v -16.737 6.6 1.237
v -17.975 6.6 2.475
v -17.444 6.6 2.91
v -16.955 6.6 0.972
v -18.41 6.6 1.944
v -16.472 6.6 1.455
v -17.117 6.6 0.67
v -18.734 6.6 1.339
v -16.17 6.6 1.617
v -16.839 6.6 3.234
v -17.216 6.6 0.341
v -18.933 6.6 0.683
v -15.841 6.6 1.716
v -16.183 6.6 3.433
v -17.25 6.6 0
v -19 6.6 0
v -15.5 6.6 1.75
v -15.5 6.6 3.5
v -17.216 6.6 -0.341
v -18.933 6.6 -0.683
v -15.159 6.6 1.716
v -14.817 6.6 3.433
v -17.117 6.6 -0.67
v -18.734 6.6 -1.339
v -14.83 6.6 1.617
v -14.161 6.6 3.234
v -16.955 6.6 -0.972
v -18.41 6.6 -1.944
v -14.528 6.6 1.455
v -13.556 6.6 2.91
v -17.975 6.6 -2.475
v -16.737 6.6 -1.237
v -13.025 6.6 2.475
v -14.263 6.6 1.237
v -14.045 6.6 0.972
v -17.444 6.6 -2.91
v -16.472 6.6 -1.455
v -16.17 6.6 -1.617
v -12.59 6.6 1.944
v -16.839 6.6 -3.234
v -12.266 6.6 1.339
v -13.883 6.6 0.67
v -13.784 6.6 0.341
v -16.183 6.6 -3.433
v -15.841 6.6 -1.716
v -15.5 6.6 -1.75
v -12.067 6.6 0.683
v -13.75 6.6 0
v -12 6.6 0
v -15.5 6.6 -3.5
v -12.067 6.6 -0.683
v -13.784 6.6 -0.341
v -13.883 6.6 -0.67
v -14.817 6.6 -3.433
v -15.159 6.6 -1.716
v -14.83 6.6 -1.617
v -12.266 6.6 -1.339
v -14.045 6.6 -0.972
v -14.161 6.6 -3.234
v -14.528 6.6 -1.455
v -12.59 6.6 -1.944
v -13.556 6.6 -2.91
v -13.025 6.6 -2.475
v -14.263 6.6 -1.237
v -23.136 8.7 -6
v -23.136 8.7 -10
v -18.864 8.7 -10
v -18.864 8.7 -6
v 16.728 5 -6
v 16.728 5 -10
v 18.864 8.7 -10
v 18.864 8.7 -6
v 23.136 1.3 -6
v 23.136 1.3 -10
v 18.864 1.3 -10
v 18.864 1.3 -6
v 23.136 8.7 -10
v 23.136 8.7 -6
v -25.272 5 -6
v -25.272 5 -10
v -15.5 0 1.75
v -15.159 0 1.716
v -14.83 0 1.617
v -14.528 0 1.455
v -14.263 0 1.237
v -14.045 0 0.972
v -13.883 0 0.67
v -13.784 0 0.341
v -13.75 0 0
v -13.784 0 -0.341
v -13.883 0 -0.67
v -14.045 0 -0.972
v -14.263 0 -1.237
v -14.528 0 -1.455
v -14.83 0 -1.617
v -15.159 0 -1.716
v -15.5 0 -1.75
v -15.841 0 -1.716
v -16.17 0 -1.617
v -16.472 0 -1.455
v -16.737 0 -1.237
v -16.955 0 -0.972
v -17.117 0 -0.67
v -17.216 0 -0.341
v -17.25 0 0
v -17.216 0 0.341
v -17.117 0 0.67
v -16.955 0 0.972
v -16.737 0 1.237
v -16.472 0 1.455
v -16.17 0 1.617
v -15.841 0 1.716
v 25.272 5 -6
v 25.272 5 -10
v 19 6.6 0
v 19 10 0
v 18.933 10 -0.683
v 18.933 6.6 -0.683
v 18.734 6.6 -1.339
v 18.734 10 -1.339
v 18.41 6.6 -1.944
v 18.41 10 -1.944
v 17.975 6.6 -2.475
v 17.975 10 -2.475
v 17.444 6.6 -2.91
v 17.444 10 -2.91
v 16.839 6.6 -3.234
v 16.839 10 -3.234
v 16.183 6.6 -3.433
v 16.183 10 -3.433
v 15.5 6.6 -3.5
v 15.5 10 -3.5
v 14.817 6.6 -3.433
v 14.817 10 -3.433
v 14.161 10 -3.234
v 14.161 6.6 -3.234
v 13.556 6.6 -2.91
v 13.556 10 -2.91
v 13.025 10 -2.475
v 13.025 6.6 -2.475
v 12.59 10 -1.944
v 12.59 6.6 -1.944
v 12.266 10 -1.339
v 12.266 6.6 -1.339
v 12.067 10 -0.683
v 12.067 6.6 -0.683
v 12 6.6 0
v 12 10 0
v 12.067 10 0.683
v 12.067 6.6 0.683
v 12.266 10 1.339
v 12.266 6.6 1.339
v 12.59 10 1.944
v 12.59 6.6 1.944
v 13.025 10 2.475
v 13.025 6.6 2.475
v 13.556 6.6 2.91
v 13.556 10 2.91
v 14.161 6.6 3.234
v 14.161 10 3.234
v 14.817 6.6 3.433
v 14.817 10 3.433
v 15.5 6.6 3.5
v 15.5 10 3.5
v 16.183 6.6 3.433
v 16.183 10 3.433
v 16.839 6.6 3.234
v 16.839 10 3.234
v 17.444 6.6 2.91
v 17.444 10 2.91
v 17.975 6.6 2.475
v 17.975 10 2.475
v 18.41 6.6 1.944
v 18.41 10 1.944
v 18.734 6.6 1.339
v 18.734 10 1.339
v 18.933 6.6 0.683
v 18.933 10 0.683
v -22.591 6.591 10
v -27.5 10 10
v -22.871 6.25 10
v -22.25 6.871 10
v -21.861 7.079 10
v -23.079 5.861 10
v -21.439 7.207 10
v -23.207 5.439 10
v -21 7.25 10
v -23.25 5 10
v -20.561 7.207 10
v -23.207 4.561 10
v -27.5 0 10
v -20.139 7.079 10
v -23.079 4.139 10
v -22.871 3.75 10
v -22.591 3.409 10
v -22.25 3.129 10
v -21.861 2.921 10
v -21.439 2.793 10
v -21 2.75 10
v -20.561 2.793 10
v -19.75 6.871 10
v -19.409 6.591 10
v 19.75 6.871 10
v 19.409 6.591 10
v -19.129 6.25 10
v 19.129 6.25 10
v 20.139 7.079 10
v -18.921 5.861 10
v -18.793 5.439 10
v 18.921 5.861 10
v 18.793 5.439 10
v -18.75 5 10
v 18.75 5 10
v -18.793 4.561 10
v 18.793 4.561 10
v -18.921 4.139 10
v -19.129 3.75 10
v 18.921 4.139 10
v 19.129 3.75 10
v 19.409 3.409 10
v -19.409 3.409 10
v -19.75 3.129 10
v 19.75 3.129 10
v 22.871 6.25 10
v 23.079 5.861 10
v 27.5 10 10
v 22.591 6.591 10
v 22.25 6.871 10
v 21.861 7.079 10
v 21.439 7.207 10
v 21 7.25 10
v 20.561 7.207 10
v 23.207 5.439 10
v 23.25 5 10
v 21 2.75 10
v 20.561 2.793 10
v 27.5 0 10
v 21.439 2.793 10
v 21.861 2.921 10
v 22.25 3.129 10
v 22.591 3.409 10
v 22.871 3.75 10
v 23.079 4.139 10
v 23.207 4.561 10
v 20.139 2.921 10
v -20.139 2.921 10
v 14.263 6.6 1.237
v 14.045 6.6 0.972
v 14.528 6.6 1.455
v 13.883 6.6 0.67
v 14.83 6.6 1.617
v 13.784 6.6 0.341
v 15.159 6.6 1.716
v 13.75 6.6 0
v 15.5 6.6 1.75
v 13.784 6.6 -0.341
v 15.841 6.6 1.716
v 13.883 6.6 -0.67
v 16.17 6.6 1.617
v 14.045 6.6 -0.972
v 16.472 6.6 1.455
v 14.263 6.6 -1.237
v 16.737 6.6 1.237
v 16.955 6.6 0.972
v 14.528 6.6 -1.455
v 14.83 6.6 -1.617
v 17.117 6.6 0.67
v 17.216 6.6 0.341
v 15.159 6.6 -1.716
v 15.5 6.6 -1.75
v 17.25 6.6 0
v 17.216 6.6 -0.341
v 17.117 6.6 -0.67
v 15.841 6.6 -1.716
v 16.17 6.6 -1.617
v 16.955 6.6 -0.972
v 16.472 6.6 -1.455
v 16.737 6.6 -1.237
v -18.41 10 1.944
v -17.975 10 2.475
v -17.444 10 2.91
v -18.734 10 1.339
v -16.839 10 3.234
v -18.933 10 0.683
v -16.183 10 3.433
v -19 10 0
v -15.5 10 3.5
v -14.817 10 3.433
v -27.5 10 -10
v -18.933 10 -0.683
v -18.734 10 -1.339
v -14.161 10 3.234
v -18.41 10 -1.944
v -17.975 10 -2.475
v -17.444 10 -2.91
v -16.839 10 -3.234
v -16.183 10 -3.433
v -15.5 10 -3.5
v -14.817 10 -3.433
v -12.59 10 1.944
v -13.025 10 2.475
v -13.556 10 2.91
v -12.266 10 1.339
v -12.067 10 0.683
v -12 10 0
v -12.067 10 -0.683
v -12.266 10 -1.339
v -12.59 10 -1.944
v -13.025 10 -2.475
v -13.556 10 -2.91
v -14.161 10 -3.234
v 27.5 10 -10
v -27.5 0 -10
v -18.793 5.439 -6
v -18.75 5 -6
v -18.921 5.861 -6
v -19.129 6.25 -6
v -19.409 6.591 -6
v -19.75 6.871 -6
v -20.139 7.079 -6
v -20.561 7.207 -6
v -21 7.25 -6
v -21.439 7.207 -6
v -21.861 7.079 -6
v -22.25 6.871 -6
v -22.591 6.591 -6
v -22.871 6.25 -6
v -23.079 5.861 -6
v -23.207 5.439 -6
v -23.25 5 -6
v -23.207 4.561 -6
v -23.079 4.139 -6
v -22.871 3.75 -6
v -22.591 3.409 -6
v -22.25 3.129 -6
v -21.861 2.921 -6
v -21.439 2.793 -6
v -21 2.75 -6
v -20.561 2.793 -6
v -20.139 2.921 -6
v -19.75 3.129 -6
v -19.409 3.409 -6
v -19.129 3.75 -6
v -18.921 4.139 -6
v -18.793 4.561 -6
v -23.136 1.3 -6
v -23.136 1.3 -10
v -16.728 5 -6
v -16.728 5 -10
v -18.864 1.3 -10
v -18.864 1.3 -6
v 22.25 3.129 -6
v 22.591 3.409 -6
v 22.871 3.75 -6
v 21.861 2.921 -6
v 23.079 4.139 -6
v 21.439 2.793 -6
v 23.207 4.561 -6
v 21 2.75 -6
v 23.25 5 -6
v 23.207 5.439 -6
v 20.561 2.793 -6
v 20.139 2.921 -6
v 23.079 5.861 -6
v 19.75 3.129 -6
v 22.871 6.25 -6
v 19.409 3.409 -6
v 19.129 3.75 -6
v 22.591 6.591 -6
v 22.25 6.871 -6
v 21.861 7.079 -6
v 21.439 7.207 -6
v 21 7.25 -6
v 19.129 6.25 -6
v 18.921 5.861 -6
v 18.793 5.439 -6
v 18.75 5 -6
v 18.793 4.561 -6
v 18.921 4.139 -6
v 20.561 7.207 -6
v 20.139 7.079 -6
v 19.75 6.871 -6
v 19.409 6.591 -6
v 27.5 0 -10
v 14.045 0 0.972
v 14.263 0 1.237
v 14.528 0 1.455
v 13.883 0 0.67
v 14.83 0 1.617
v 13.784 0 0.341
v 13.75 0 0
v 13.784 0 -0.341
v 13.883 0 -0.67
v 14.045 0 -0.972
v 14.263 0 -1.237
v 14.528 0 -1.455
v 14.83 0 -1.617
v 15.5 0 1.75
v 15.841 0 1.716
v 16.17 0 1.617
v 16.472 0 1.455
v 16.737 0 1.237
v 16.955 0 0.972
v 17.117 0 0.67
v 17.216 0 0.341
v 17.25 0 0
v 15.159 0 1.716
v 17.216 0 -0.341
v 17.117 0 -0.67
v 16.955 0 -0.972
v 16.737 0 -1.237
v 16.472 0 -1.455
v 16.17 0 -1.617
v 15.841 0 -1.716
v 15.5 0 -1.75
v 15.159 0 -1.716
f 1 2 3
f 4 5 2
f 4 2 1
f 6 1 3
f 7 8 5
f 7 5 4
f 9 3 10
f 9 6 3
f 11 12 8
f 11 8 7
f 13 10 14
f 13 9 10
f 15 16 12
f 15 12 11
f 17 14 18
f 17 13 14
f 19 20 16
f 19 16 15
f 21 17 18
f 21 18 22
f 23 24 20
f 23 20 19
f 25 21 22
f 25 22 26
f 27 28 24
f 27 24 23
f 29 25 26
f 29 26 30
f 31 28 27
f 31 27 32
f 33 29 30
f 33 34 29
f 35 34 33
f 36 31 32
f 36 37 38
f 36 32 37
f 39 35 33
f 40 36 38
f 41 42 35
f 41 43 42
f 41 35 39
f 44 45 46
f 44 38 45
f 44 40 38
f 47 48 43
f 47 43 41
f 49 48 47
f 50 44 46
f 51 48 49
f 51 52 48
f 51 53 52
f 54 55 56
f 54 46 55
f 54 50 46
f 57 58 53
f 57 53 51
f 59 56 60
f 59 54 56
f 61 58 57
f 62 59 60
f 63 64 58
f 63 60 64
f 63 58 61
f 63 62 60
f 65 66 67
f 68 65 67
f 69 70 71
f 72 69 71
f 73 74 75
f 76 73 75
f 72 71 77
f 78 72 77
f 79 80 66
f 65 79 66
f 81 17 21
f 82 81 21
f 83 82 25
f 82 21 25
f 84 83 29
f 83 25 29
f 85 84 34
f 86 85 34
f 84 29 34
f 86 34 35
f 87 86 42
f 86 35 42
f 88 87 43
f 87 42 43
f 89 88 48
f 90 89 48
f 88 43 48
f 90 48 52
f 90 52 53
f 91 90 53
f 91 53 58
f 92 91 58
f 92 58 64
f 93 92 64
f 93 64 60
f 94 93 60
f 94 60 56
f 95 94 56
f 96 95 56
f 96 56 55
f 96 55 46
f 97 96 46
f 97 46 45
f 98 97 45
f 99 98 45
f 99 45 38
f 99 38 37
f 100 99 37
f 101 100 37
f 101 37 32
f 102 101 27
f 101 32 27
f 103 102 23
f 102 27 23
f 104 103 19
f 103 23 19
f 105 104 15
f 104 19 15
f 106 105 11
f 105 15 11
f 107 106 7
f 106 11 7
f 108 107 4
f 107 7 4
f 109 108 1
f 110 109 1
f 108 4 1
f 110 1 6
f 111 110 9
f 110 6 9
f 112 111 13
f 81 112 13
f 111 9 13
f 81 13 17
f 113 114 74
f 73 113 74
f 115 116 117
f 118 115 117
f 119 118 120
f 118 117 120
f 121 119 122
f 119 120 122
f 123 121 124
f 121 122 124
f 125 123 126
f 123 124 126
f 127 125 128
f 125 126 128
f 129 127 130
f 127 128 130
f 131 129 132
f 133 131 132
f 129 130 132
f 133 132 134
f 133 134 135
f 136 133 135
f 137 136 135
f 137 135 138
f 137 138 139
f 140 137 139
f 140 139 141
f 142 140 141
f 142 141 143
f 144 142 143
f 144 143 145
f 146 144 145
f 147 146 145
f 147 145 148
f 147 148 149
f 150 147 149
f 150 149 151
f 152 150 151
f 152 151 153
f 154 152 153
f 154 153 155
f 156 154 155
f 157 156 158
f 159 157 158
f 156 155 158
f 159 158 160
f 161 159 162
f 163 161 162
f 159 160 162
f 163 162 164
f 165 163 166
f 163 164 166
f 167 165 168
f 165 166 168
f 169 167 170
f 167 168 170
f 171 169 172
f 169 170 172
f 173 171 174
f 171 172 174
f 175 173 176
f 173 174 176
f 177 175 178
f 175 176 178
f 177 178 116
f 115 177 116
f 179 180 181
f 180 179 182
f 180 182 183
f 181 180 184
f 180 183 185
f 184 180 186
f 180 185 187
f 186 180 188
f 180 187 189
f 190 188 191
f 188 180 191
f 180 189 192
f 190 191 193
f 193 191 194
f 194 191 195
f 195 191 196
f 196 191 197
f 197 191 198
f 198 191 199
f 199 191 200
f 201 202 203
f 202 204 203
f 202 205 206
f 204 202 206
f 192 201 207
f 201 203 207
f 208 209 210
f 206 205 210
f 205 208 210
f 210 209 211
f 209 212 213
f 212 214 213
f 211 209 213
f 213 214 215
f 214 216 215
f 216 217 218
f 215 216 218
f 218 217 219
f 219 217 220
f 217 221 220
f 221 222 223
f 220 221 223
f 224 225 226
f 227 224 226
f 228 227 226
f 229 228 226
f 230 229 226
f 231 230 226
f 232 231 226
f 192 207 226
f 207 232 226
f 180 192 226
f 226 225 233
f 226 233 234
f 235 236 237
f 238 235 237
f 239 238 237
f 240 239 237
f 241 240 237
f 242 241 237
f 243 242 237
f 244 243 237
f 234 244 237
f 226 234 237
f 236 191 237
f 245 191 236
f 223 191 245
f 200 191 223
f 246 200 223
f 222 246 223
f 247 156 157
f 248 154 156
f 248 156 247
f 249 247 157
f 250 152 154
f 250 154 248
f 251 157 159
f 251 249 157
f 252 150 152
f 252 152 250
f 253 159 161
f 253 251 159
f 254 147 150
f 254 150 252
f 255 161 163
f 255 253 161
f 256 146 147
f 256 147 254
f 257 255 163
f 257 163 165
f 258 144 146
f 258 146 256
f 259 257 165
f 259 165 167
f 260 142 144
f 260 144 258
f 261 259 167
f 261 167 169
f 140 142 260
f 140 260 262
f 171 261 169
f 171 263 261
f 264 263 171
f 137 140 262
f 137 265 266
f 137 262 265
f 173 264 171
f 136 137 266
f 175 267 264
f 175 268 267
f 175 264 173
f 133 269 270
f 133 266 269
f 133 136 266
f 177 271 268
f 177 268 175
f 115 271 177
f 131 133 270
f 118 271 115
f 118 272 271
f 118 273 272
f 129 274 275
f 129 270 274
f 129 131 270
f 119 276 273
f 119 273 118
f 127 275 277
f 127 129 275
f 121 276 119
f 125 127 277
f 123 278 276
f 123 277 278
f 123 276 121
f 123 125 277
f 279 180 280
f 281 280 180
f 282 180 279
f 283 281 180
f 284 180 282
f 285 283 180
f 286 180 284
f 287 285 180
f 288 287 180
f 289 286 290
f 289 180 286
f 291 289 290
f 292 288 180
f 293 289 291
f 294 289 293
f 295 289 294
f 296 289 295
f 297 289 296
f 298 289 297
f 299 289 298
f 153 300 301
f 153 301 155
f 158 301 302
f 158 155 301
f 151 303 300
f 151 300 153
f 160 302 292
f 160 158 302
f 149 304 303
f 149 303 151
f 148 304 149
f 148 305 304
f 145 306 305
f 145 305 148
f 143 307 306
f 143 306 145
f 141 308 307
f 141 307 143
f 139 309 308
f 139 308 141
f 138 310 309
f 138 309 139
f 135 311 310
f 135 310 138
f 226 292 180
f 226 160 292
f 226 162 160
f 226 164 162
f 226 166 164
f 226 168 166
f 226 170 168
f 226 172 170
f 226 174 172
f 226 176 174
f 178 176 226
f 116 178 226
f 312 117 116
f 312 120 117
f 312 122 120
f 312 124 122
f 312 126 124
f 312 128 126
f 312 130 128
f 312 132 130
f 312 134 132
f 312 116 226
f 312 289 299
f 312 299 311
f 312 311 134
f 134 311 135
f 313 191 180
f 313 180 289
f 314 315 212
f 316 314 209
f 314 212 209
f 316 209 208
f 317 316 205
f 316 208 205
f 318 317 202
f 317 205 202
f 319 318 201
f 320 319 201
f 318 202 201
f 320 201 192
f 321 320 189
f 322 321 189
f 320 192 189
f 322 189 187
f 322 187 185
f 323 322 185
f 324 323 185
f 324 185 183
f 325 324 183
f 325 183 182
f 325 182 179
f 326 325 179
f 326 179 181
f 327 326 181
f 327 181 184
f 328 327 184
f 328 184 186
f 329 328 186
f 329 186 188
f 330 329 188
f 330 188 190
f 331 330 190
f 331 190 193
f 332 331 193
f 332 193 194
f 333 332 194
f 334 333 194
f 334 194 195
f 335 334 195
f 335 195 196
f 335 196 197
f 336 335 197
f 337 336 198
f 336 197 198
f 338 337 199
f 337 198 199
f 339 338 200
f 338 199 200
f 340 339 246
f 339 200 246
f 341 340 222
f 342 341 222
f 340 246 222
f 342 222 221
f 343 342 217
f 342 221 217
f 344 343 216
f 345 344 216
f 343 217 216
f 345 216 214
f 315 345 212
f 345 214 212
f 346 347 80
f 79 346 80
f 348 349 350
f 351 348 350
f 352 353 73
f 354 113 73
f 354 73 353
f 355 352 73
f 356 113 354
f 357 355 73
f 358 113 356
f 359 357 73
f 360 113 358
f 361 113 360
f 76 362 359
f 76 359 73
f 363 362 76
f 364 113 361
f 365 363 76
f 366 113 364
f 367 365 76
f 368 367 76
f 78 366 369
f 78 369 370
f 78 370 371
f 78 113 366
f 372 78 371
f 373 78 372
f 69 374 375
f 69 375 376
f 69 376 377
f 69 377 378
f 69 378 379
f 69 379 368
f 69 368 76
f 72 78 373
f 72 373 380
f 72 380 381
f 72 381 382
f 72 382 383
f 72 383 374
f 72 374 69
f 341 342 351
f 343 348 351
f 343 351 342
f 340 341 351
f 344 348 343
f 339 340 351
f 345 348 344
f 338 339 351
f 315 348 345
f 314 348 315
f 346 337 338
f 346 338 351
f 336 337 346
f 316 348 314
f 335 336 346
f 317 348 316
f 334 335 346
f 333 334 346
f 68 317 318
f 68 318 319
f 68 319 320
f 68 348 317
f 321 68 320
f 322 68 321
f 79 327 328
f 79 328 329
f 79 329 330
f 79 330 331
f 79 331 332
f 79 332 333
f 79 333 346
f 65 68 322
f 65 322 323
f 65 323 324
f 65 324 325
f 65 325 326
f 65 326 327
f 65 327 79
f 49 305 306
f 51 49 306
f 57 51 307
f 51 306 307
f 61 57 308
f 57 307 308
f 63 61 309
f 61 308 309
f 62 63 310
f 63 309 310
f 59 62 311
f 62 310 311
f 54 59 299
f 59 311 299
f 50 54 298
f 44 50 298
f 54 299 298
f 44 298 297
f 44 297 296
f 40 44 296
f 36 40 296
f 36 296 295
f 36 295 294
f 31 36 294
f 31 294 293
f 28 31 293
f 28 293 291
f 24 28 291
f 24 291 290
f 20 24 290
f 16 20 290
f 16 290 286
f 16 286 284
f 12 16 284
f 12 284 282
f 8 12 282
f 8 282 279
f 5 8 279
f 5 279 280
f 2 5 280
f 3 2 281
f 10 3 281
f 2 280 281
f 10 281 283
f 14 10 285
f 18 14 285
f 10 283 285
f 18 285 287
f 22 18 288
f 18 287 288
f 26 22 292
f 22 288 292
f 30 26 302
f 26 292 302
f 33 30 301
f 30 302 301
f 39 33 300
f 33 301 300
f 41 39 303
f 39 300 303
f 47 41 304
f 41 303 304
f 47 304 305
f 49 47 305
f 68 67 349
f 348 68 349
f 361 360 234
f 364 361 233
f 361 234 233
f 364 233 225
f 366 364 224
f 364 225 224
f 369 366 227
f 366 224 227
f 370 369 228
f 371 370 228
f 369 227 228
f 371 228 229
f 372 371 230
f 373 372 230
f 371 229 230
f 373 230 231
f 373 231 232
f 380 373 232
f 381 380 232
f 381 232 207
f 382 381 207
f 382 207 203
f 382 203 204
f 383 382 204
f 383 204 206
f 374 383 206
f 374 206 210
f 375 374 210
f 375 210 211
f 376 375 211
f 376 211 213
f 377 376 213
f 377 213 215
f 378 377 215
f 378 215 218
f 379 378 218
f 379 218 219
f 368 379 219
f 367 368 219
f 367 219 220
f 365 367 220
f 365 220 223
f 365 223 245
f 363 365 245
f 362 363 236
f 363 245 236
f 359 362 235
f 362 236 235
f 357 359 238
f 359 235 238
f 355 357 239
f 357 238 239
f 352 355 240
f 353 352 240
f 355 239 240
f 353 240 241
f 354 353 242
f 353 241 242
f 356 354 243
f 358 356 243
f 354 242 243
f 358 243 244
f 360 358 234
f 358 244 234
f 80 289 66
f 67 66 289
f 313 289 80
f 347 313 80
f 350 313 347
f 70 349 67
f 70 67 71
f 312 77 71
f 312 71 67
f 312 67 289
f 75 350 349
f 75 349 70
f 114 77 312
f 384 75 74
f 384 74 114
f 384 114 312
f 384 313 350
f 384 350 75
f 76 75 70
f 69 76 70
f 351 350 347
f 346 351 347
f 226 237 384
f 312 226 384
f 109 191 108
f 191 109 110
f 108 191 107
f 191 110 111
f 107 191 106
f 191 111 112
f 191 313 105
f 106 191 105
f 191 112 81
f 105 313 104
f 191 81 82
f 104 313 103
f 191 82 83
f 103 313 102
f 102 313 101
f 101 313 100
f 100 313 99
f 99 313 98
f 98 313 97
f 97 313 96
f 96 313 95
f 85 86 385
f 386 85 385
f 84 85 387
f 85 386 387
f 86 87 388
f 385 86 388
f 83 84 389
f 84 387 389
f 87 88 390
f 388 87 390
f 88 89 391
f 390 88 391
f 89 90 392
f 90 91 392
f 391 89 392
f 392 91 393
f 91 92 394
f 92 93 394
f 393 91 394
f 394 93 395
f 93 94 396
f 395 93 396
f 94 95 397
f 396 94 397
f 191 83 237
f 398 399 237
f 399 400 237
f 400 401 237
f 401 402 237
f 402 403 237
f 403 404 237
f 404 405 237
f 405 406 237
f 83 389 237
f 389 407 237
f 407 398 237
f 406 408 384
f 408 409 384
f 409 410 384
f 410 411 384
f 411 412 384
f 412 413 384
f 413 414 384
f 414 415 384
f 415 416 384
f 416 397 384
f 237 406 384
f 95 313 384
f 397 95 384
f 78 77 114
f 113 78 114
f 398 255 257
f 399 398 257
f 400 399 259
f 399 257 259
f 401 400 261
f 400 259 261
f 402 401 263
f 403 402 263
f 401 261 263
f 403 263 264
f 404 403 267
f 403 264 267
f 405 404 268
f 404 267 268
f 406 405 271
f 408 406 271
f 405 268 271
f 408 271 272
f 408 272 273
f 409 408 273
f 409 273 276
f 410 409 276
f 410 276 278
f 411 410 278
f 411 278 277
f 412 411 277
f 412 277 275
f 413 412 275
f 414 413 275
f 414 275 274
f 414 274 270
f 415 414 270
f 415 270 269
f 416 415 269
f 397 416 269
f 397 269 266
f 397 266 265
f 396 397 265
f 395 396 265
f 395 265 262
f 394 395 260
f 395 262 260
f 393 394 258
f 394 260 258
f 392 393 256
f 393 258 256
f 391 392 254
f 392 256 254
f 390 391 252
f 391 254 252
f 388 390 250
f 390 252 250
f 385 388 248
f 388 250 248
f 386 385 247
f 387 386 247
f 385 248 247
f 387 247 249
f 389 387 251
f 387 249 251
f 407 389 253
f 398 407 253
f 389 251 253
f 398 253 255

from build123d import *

# Parameters (mm, degrees)
SKETCH1_W                                           = 55
SKETCH1_H                                           = 20
BOSS_EXTRUDE1_DEPTH                                 = 10
SKETCH2_R                                           = 2.25
CUT_EXTRUDE1_DEPTH                                  = 36.443617197
SKETCH3_R                                           = 1.75
CUT_EXTRUDE2_DEPTH                                  = 31.923292192
CBORE_FOR_M3_HEX_SOCKET_HEAD_CAP_SCREW1_D           = 3.4
CBORE_FOR_M3_HEX_SOCKET_HEAD_CAP_SCREW1_CBORE_D     = 7
CBORE_FOR_M3_HEX_SOCKET_HEAD_CAP_SCREW1_CBORE_DEPTH = 3.4
CUT_EXTRUDE3_DEPTH                                  = 4


with BuildPart() as part:
    # Sketch1 → Boss-Extrude1 (new body)
    with BuildSketch(Plane(origin=(0, 0, 0), x_dir=(1, 0, 0), z_dir=(0, 1, 0))):
        Rectangle(SKETCH1_W, SKETCH1_H)
    extrude(amount=BOSS_EXTRUDE1_DEPTH)

    # Sketch2 → Cut-Extrude1 (cut, through all)
    with BuildSketch(Plane.XY.offset(10)):
        with Locations((-21, 5)):
            Circle(SKETCH2_R)
        with Locations((21, 5)):
            Circle(SKETCH2_R)
    extrude(amount=-CUT_EXTRUDE1_DEPTH, mode=Mode.SUBTRACT)

    # Sketch3 → Cut-Extrude2 (cut, through all)
    with BuildSketch(Plane(origin=(0, 10, 0), x_dir=(1, 0, 0), z_dir=(0, 1, 0))):
        with Locations(Location((-15.5, 0, 0), (0, 0, 270))):
            Circle(SKETCH3_R)
        with Locations(Location((15.5, 0, 0), (0, 0, 270))):
            Circle(SKETCH3_R)
    extrude(amount=-CUT_EXTRUDE2_DEPTH, mode=Mode.SUBTRACT)

    # CBORE for M3 Hex Socket Head Cap Screw1 (through all)
    with Locations(Plane(origin=(0, 10, 0), x_dir=(1, 0, 0), z_dir=(0, 1, 0))):
        with Locations((-15.5, 0), (15.5, 0)):
            CounterBoreHole(CBORE_FOR_M3_HEX_SOCKET_HEAD_CAP_SCREW1_D / 2, CBORE_FOR_M3_HEX_SOCKET_HEAD_CAP_SCREW1_CBORE_D / 2, CBORE_FOR_M3_HEX_SOCKET_HEAD_CAP_SCREW1_CBORE_DEPTH)

    # Sketch6 → Cut-Extrude3 (cut)
    with BuildSketch(Plane(origin=(0, 0, -10), x_dir=(-1, 0, 0), z_dir=(0, 0, -1))):
        Polygon((-16.727608008, 5), (-18.863804004, 8.7), (-23.136195996, 8.7), (-25.272391992, 5), (-23.136195996, 1.3), (-18.863804004, 1.3), align=None)
        Polygon((16.727608008, 5), (18.863804004, 1.3), (23.136195996, 1.3), (25.272391992, 5), (23.136195996, 8.7), (18.863804004, 8.7), align=None)
    extrude(amount=-CUT_EXTRUDE3_DEPTH, mode=Mode.SUBTRACT)


solid = part.part
